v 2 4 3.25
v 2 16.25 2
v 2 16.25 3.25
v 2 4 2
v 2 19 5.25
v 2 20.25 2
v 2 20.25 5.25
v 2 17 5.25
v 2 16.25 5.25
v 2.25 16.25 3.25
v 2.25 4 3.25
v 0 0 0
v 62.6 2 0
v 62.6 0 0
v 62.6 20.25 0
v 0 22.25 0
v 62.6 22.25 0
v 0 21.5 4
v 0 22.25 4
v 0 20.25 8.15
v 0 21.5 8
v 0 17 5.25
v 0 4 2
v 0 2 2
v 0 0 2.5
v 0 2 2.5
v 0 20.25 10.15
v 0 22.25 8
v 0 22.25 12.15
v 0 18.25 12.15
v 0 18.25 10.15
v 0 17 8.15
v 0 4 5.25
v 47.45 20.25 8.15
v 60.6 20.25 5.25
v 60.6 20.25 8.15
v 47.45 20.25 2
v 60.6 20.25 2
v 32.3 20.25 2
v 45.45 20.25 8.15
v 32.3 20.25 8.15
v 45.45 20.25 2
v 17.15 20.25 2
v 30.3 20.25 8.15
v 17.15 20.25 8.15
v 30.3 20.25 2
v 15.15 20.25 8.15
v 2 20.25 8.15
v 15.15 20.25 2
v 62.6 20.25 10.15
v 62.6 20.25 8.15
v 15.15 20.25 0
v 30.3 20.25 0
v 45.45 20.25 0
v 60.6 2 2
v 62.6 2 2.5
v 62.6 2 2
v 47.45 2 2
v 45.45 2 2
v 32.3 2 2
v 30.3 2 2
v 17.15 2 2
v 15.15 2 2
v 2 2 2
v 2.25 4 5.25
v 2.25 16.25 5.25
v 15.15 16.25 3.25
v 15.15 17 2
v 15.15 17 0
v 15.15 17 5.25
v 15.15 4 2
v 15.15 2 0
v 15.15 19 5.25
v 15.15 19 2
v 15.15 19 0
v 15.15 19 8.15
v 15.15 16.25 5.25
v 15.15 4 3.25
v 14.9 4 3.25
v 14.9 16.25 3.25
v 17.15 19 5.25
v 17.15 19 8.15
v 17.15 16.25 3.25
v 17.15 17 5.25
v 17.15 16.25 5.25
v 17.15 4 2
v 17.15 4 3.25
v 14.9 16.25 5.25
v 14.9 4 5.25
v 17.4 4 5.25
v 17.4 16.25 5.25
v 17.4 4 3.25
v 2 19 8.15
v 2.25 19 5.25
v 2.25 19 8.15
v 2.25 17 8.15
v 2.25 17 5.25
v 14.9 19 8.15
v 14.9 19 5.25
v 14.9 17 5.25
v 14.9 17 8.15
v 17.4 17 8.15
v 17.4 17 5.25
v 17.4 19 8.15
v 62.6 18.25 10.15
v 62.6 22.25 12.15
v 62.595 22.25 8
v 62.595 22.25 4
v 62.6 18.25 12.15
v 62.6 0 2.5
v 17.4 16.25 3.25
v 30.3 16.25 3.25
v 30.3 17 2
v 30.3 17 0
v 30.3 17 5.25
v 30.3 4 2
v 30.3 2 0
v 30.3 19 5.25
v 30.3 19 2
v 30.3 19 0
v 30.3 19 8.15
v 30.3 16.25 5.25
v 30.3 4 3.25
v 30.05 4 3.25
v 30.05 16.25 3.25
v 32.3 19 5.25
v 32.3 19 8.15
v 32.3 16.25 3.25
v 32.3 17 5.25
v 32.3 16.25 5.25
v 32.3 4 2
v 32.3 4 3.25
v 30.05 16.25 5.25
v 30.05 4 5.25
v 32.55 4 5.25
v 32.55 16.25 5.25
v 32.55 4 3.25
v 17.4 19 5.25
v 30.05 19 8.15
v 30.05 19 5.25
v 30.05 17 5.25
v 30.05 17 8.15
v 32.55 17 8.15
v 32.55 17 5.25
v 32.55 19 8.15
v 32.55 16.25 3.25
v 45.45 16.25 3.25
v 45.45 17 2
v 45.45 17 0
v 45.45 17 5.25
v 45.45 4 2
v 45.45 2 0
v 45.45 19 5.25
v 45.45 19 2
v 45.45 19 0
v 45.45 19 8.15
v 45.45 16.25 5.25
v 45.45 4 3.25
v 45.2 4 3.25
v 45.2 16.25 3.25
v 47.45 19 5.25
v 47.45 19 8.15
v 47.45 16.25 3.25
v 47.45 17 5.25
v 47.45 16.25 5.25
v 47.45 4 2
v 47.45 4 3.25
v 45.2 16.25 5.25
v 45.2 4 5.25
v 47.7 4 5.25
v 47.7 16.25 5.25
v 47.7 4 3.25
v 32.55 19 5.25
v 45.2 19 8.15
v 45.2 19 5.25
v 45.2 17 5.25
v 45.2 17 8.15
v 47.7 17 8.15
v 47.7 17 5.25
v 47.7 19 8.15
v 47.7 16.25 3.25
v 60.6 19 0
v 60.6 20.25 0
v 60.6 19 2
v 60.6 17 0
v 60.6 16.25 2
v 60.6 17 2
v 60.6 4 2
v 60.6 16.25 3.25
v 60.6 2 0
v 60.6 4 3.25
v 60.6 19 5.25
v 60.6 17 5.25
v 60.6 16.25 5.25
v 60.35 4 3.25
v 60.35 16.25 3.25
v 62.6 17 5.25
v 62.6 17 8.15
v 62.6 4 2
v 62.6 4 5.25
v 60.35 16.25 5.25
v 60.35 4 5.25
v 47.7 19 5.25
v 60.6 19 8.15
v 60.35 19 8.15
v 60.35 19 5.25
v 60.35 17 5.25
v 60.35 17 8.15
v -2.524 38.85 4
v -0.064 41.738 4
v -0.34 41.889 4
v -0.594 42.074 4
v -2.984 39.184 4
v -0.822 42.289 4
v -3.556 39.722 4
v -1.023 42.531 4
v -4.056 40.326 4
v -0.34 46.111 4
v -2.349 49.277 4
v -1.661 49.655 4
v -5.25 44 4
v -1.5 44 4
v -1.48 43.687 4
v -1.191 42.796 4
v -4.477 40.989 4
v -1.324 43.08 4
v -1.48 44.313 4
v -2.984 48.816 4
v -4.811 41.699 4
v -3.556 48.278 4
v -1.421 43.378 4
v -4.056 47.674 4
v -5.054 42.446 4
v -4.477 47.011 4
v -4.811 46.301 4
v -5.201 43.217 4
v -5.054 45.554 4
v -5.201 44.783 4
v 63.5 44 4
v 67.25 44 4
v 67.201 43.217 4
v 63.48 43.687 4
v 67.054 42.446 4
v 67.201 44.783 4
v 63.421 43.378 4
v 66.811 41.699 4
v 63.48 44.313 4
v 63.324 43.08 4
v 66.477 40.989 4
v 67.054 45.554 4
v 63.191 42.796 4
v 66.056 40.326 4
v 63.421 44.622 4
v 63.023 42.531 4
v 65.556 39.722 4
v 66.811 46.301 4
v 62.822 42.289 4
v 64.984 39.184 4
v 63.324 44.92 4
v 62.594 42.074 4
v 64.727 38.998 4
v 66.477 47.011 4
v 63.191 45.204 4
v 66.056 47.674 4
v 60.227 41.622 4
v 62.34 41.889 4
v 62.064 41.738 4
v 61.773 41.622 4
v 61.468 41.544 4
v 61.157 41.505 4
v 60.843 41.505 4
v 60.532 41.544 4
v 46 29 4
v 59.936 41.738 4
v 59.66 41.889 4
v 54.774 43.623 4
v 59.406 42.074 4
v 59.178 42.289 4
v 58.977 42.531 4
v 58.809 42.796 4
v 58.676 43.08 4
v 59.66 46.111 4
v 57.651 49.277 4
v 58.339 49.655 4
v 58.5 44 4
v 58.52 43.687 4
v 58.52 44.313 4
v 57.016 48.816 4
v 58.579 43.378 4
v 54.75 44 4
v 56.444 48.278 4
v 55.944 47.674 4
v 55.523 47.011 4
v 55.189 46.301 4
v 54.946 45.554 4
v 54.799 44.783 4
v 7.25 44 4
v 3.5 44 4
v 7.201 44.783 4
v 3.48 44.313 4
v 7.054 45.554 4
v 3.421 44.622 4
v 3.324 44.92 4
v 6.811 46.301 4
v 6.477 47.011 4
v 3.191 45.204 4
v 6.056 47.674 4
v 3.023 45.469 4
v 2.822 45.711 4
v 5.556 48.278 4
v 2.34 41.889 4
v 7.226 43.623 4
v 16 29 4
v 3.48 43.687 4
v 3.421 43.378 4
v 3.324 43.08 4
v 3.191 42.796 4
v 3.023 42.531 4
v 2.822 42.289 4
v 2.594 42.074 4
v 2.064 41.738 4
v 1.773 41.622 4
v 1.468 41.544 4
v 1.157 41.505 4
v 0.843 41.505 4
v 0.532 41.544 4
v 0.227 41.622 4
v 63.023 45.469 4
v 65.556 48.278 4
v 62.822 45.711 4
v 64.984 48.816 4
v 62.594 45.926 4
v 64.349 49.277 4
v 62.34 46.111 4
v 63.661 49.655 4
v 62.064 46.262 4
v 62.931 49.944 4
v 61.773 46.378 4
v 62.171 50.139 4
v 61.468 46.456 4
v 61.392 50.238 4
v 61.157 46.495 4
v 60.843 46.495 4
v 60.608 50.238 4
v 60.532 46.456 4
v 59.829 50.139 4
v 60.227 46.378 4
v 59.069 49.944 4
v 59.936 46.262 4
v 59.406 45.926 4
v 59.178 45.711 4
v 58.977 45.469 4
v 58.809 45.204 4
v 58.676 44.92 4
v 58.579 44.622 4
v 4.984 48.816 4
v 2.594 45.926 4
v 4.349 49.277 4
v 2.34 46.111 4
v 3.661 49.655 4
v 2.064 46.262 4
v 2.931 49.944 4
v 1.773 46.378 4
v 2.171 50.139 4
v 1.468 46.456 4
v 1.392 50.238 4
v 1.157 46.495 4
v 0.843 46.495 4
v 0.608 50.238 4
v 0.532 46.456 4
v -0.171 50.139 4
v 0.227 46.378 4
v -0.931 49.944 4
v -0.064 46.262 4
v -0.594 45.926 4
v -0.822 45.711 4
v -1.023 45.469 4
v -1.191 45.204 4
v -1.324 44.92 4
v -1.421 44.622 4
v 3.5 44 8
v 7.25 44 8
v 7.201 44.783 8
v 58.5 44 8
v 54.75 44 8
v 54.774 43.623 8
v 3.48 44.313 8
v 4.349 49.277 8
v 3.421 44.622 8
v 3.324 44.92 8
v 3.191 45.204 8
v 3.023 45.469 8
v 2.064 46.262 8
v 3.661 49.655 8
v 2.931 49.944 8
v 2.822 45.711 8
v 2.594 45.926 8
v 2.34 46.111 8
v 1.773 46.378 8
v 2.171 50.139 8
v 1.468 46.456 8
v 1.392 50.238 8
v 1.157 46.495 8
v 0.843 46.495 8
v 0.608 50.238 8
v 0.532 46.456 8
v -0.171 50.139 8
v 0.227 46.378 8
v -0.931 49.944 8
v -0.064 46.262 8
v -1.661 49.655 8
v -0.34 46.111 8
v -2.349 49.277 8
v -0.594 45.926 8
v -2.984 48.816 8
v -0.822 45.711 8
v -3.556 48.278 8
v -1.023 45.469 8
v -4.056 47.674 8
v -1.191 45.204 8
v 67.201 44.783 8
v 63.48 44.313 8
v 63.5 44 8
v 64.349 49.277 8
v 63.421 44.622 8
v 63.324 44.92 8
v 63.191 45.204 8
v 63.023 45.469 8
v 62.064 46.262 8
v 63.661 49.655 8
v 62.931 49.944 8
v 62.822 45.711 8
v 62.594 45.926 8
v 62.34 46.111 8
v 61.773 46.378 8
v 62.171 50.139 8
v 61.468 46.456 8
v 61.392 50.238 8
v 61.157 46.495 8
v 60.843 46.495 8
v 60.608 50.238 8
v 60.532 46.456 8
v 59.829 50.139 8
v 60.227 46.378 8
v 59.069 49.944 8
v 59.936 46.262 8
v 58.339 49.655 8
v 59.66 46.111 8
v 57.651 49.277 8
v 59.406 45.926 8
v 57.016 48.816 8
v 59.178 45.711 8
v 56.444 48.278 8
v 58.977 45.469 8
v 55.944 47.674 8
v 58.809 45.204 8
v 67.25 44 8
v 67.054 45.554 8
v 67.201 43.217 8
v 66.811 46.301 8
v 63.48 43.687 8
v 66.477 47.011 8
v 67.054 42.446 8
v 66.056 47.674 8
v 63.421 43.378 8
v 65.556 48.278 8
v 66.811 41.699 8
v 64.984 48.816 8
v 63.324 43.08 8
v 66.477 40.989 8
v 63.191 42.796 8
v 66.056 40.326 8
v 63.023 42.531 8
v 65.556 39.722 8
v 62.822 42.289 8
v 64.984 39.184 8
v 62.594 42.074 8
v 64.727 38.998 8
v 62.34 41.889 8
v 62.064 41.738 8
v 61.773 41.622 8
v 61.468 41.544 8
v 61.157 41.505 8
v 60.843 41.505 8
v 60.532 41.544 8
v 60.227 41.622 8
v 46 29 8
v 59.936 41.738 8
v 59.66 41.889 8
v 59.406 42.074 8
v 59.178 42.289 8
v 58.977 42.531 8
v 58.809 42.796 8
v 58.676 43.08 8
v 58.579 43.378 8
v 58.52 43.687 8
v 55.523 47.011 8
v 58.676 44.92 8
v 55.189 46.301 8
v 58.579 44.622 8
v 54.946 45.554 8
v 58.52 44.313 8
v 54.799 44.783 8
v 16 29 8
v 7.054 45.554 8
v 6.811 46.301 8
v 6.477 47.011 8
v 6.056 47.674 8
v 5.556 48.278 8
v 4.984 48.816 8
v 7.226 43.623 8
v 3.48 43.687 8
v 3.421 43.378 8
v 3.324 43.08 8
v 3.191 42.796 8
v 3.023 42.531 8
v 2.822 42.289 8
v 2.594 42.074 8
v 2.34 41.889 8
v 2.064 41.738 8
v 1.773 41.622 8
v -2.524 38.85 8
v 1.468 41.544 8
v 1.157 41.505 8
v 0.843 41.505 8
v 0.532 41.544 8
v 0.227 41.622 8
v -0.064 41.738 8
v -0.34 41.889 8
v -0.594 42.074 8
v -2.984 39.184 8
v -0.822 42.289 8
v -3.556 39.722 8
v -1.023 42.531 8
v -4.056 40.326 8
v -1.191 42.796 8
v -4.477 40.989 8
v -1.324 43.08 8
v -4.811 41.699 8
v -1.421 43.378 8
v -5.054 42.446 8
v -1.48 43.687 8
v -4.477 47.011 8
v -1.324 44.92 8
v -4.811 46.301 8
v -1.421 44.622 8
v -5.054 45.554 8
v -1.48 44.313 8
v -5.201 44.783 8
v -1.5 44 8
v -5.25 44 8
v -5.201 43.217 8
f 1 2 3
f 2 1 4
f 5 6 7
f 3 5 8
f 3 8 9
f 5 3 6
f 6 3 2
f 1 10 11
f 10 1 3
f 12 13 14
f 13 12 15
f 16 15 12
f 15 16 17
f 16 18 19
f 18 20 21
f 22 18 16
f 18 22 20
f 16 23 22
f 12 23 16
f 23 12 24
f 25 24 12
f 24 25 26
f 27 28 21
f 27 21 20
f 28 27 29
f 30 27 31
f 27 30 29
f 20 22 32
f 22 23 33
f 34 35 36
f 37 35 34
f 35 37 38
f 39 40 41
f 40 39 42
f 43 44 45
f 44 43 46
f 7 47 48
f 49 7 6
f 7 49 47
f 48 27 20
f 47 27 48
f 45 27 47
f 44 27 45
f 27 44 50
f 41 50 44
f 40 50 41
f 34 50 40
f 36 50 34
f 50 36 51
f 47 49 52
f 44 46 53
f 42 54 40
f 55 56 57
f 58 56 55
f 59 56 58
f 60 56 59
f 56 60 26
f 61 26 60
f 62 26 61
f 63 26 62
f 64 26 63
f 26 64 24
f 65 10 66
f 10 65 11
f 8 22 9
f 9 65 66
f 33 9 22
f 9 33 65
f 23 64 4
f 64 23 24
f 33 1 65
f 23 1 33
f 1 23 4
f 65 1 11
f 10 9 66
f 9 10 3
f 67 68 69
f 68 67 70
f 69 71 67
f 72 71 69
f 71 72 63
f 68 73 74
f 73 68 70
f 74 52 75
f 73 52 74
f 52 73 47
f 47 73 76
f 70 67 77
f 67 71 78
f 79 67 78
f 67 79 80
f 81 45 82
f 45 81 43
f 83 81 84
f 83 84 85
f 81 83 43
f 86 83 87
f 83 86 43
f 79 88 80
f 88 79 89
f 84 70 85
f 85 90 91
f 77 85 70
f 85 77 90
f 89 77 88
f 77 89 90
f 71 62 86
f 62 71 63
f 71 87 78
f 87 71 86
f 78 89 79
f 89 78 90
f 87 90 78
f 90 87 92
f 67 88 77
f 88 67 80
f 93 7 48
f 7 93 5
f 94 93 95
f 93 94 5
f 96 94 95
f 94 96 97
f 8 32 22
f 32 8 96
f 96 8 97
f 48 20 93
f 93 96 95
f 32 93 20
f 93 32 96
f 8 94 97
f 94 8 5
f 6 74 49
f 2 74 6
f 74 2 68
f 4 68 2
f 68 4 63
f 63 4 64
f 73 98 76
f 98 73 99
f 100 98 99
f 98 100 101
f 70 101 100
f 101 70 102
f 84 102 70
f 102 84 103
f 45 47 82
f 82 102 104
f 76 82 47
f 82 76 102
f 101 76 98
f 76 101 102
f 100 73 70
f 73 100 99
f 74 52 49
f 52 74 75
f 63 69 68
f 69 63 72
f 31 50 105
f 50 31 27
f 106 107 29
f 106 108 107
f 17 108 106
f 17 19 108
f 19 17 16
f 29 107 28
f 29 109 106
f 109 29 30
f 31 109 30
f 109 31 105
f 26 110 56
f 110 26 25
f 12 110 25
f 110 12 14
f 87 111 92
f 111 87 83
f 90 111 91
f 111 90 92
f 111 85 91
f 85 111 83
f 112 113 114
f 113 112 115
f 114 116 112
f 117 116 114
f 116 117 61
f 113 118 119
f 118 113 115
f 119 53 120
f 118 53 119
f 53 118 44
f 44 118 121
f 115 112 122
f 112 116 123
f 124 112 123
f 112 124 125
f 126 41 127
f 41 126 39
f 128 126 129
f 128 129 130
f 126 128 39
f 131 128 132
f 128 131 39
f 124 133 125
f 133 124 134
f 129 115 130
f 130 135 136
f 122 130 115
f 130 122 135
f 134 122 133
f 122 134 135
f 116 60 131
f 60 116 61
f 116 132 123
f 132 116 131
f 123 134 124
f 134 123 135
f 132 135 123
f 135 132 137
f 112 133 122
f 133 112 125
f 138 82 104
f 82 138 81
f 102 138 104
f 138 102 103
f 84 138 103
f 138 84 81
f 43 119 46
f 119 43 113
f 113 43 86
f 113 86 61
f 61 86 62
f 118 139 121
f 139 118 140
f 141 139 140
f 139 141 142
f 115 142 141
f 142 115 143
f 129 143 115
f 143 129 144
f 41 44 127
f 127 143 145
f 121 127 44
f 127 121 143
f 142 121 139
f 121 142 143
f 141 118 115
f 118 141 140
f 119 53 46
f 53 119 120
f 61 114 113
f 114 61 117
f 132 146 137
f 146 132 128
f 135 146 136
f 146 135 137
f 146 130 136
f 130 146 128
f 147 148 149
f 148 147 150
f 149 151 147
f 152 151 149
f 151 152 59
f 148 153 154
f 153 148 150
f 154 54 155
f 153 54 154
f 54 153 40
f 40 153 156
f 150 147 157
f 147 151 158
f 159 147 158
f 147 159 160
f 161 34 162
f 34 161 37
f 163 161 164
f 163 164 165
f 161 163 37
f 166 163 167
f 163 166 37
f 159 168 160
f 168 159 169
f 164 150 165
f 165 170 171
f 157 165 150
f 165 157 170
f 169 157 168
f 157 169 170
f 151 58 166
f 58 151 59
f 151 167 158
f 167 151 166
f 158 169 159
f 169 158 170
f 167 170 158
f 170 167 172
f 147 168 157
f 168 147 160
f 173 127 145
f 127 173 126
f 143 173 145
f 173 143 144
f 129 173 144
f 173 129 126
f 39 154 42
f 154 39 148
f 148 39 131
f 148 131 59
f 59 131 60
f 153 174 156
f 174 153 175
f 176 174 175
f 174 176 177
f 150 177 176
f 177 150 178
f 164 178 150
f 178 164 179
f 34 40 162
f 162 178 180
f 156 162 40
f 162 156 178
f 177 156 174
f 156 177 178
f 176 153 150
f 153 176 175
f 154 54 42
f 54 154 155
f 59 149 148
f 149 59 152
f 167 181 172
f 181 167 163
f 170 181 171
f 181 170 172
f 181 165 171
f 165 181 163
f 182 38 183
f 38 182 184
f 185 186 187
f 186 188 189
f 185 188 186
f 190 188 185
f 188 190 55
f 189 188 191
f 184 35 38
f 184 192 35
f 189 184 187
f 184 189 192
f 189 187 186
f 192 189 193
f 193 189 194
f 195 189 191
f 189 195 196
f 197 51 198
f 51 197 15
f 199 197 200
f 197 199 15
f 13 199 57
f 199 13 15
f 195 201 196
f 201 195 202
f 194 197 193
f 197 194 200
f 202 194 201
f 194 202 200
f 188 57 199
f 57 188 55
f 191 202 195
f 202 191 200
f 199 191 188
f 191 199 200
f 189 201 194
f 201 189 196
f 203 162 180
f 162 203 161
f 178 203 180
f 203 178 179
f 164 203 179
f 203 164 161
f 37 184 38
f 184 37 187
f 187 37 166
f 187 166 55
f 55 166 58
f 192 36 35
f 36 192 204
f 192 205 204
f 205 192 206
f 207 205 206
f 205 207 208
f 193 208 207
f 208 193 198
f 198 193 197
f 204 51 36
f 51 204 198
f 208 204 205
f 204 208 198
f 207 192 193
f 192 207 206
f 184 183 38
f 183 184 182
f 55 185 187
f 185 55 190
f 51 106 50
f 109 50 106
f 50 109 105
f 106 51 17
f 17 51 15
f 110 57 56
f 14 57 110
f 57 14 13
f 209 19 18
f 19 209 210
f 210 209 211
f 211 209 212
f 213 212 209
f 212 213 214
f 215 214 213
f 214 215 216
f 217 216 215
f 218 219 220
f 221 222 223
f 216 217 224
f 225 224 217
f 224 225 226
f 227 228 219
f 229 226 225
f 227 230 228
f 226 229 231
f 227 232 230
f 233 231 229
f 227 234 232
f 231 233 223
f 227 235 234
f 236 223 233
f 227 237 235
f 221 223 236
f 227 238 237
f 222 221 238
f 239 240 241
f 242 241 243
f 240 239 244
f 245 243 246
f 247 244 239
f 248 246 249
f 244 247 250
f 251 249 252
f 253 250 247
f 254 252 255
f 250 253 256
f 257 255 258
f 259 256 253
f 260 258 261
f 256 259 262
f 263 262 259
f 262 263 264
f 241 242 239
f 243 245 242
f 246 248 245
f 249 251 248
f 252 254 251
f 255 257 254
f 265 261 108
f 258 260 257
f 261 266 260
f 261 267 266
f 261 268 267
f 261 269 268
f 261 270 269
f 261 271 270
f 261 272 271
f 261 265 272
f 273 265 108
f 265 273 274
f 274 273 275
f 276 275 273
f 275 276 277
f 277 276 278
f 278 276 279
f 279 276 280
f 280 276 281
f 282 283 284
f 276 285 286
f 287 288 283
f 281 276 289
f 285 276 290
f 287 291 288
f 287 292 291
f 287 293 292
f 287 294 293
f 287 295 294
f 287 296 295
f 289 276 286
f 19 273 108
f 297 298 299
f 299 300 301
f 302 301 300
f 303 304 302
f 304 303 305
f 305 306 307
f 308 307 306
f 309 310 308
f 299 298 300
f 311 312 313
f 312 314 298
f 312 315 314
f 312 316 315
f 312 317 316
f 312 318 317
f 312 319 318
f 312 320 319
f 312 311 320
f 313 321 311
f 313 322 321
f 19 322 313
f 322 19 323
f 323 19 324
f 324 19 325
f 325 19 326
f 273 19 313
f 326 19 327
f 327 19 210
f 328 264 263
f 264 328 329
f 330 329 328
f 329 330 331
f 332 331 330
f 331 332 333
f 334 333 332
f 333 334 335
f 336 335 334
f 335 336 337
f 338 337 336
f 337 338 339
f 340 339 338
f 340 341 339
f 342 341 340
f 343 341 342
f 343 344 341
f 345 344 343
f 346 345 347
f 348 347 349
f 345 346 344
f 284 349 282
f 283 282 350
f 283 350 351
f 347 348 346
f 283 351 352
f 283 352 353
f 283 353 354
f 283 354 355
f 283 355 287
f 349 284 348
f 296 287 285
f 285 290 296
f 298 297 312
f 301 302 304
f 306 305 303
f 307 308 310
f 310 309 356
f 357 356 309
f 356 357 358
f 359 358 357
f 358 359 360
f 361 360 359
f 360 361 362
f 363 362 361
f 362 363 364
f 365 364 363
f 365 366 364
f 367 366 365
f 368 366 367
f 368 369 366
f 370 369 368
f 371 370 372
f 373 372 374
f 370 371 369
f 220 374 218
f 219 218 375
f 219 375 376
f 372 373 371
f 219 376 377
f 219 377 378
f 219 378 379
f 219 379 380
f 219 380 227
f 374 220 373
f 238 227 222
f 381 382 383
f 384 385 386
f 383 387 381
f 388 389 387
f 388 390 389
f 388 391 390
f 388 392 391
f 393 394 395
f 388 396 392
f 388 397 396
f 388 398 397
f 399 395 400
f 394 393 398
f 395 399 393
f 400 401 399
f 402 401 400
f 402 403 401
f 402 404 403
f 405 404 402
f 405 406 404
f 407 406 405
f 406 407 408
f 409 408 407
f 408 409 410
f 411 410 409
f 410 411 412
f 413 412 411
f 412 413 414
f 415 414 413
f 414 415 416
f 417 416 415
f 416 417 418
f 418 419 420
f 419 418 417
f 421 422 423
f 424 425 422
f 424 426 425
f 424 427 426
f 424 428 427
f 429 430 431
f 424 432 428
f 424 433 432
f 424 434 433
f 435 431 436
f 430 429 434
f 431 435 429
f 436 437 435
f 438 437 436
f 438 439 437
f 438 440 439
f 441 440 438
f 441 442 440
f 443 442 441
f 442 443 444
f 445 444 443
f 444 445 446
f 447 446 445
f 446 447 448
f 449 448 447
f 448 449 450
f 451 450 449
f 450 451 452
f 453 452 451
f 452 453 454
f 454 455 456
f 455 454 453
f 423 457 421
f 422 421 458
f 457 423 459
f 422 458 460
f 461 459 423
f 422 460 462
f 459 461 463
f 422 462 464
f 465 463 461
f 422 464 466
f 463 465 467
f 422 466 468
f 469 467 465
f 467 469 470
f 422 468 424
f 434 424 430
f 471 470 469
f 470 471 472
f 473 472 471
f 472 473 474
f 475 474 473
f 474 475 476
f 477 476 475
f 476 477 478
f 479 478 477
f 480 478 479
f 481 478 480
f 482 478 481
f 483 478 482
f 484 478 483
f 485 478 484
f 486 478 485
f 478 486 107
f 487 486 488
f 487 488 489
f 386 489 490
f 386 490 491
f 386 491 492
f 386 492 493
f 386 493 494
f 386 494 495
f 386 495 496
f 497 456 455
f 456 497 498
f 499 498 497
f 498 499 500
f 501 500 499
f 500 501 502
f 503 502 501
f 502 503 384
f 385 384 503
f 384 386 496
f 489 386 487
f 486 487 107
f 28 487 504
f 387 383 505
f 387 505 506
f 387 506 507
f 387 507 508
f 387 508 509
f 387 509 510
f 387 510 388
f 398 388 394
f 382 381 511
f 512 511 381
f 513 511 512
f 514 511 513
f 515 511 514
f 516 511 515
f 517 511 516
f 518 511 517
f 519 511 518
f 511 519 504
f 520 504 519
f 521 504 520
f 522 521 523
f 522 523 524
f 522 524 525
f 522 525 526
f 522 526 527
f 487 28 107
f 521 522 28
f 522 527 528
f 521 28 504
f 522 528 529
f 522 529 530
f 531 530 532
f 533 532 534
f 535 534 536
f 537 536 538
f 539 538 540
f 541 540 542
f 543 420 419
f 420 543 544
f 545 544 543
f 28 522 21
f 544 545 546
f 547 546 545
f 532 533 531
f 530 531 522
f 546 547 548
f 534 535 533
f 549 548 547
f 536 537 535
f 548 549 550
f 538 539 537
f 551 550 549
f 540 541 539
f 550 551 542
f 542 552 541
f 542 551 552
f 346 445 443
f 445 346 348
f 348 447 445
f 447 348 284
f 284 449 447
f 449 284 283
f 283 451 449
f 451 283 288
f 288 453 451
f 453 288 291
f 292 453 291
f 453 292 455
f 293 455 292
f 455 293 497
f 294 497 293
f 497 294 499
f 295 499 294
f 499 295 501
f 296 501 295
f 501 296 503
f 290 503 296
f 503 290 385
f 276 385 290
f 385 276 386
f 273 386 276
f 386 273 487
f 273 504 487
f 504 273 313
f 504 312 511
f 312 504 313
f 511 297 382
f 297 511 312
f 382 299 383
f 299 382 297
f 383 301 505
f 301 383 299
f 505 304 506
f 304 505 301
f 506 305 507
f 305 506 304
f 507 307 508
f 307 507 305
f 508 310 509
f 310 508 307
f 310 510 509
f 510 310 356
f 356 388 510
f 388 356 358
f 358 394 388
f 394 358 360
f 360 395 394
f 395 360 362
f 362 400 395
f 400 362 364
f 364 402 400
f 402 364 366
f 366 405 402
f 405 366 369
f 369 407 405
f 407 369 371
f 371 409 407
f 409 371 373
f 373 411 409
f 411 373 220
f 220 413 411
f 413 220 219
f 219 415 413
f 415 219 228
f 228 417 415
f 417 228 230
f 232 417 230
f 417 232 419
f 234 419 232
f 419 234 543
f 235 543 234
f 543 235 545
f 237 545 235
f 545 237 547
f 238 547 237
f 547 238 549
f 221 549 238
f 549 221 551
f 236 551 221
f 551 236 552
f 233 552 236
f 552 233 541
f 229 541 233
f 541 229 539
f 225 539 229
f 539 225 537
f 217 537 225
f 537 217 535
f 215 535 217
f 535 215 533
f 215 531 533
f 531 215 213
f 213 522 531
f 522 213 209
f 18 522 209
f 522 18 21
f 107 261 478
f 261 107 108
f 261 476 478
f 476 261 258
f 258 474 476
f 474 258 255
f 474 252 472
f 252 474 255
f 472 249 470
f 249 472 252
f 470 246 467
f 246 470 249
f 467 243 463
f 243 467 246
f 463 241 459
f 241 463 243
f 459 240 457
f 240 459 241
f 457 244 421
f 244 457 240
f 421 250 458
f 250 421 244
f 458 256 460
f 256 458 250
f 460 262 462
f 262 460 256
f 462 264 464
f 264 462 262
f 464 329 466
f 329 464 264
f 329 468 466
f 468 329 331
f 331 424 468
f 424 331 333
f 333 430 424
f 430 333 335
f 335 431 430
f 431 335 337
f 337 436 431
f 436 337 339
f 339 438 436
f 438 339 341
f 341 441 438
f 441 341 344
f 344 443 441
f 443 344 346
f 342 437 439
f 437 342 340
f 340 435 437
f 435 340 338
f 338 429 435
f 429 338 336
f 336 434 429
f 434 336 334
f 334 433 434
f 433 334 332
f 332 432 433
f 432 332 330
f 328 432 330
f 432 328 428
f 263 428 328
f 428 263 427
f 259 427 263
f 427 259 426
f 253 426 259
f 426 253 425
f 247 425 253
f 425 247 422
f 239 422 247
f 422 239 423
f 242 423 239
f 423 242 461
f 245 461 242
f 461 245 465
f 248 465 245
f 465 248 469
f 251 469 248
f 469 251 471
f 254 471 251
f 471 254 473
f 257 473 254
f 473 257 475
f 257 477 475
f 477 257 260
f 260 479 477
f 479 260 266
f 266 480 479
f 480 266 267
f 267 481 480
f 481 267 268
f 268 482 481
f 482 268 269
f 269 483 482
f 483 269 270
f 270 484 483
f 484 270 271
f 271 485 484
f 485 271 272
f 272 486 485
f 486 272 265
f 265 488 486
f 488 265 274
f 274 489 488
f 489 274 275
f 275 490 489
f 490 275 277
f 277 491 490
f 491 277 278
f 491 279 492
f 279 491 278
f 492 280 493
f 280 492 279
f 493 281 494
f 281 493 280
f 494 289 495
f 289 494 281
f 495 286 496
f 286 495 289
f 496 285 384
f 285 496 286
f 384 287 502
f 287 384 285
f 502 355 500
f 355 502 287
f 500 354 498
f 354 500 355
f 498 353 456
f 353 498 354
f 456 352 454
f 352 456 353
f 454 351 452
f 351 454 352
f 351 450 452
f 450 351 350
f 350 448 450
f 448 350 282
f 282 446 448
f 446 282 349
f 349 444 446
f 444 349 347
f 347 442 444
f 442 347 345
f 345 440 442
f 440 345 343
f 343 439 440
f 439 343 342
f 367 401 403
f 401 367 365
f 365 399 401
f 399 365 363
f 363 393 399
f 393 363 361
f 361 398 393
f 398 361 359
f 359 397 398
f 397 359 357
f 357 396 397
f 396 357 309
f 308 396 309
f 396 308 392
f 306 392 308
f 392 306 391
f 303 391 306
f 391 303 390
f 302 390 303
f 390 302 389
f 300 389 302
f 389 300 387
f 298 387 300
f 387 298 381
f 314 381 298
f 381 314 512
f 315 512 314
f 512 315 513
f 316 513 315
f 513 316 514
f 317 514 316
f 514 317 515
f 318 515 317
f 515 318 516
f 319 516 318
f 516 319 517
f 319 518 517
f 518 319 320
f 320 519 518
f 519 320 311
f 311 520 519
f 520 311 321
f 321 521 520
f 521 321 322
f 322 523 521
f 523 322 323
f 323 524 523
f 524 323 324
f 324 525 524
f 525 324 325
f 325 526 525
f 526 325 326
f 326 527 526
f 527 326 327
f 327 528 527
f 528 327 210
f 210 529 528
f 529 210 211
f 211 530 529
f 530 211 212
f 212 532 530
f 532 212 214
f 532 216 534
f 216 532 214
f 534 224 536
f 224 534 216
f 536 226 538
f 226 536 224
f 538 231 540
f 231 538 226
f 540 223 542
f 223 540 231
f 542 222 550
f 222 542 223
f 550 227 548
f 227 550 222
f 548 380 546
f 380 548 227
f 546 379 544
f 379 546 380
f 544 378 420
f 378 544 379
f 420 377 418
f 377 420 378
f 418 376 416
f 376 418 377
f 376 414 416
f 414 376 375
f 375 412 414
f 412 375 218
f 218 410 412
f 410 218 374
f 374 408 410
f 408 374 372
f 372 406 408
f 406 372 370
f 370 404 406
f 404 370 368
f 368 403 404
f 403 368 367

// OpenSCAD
// ////////////////////////////////////////////////
//
// WAGO 221 mount
//
// Creates a single row or double row set of 221 blocks
// with mounting tabs/ears at either end.
//
// Created - 2017/01/01 by Joo Chung
//
// ////////////////////////////////////////////////

// ////////////////////////////////////////////////
// vector of blocks. each element specifies the number of conductors for that block
// EDIT THIS
blocks = [2,2,2,2]; // a single 5 conductor blocks 
// blocks = [5, 3, 2]; // a set of 5 conductor, 3 conductor, 2 conductor blocks
// blocks = [5, 5, 5]; // a set of three 5 conductor blocks
// blocks = [2]; // a single 2 conductor block
// blocks = [3]; // a single 3 conductor block


// ////////////////////////////////////////////////
// Mirror the mount, stand it up, and put tabs on bottom.
// 0 - no mirror, 1 - mirror, rotate so its standing up, and reposition tabs
// 2 - mirror, rotate so that they are laying flat, and reposition tabs.
// EDIT THIS
mirror = 0;

// ////////////////////////////////////////////////
// Tabs - include or exclude mounting tabs
// EDIT THIS: 0 - no tabs, 1 - tabs
tabs = 0;
// EDIT THIS: radius of hole in tab
tabradius = 2.6;
// EDIT THIS: thickness of tab
tabheight = 4;
// EDIT THIS: Set width and length of the tab. (tab is basically a square)
tabwidth = 0;



// ////////////////////////////////////////////////
// Block dimensions in mm -- DO NOT EDIT
conwidth = 5.6; // width of a single conductor
// DO NOT EDIT
border = 1.75; // block transparent plastic border
// DO NOT EDIT
blockdepth = 18.25;
// DO NOT EDIT
fudge = 0.2;

// ////////////////////////////////////////////////
// OpenSCAD special variables -- DO NOT EDIT
$fa = 1;
// DO NOT EDIT
$fs = 0.4;

// ////////////////////////////////////////////////
// Functions
function bw(x) = conwidth*x+border+fudge; // block width
function mw(i, n) = ( i==0 ? bw(blocks[i]) + 2 + mw(i+1, n) : (i < n ? bw(blocks[i]) + 2 + mw(i+1, n) : 0)); // mount width (index, max index)


// ////////////////////////////////////////////////
// Modules
module tab(width, hole, thickness) {
    difference() {
        union () {
            cylinder(thickness,width/2,width/2, true);
            translate([width/4,0,0]) cube([width/2,width,thickness], true);
        }
    cylinder(width,hole,hole, true);
    }
}

module shoulder (depth) {
    difference () {
        union () {
            cube([2, blockdepth, 3.25], false);
            translate([0,0,3.25]) cube([2.25, blockdepth, 2], false);
        }
        translate([0,0,2]) cube([2.25,2,3.25], false);
        translate([2,blockdepth-4,2]) cube([0.25,4,3.25], false);
    }
}


module backshoulder (height) {
    difference() {
        union() {  
            translate([0, 2, 0]) cube ([2, 1.25, 10.15]);
            cube ([2.25, 2, 10.15]);
        }
        translate([0,0,10.15-2]) cube([2.25,3.25,2]);
        translate([2,0,2]) cube([1.25,3.25,3.25]);
    }
}



// WAGO 221 block
module block (nconn) {
    blockwidth = bw(nconn);

    // base
    translate([2,2,0]) cube([blockwidth, blockdepth, 2], false);
    
    // back headboard
    translate([0,blockdepth+2,0]) cube([blockwidth+4, 2, 10.15], false);

    // back lip
    translate([0,blockdepth,10.15]) cube([blockwidth+4, 4, 2], false);
    
    // front lip
    translate([0,0,0]) cube([blockwidth+4, 2, 2.5], false);

    // left shoulder and right shoulders
    translate([0,2,0]) shoulder();
    translate([blockwidth+4,2,0]) mirror() shoulder(); 
    
    // back left and shoulder
    translate([0, blockdepth-1.25, 0]) backshoulder(); 
    translate([blockwidth+4, blockdepth -1.25, 0]) mirror() backshoulder();
    
}



// ////////////////////////////////////////////////
// MAIN BODY

mountwidth=mw(0, len(blocks));
if (mirror==0) { // No mirror. Single row of blocks
    // create array of blocks
    for (i=[0:len(blocks)-1]) {
        offset = (i==0) ? tabwidth : tabwidth + mw(0, i);
        translate([offset, 0, 0]) block(blocks[i]);
    }
    
    // left and right tabs
    if (tabs==1) {
        translate([tabwidth/2,(blockdepth+4)/2,tabheight/2]) tab (tabwidth, tabradius, tabheight);
        translate([mountwidth+2+tabwidth+tabwidth/2,(blockdepth+4)/2,tabheight/2]) mirror() tab (tabwidth, tabradius, tabheight);
    }
} else if (mirror==1) { // Mirrored. two rows of blocks, back to back.
    // Row #1. Stand up on headboard.
    rotate([-90,0,0]) for (i=[0:len(blocks)-1]) {
        offset = (i==0) ? tabwidth : tabwidth + mw(0, i);
        translate([offset, 0, -1]) block(blocks[i]);
    }
    
    // Row #2. Opposite rotation. Stand up on headbord
    rotate([90,0,0]) mirror ([0, 1, 0]) for (i=[0:len(blocks)-1]) {
        offset = (i==0) ? tabwidth : tabwidth + mw(0, i);
        translate([offset, 0, -1]) block(blocks[i]);
    }   
    
    // left and right tabs
    if (tabs==1) {
        translate([tabwidth/2,0,-blockdepth-tabheight/2]) tab (tabwidth, tabradius, tabheight);
        translate([mountwidth+2+tabwidth+tabwidth/2,0,-blockdepth-tabheight/2]) mirror() tab (tabwidth, tabradius, tabheight);
    }
} else if (mirror==2) {
    // Row #1. 
    for (i=[0:len(blocks)-1]) {
        offset = (i==0) ? tabwidth : tabwidth + mw(0, i);
        translate([offset, -blockdepth-6, -1]) block(blocks[i]);
    }
    
    // Row #2. Flip
    mirror ([0, 1, 0]) for (i=[0:len(blocks)-1]) {
        offset = (i==0) ? tabwidth : tabwidth + mw(0, i);
        translate([offset, -blockdepth, -1]) block(blocks[i]);
    }   
    
    // left and right tabs
    if (tabs==1) {
        translate([tabwidth/2,-3,(tabheight-2)/2]) tab (tabwidth, tabradius, tabheight);
        translate([mountwidth+2+tabwidth+tabwidth/2,-3,(tabheight-2)/2]) mirror() tab (tabwidth, tabradius, tabheight);
    }
}

translate([0,0,4]) {
linear_extrude(4) {
    translate([66,49,0]) {
        rotate([0,0,180]) {
            difference() {
                mountingPlate();
                
                translate([5,5,0]) {
                    ender3BedMntPattern();
                }
            }
        }
    }
}
}

module mountingPlate() {
    union() {
        difference() {
            baseMountingPlate();
            
            square([5,5]);
            
            translate([65,0,0]) {
                square([5,5]);
            }
        }
        
        translate([5,5,0]) {
            circle(d=12.5, $fn=50);
        }
        
        translate([65,5,0]) {
            circle(d=12.5, $fn=50);
        }
    }
}

module baseMountingPlate() {
        mount_points = [
        [0,0],
        [8,0],
        [20,20],
        [50,20],
        [62,0],
        [70,0],
        [66,27.5],
        [3.5,27.5],
    ];

    mount_lines = [
        [0,1,2,3,4,5,6,7]
    ];

    polygon(mount_points, mount_lines); 
}

module ender3BedMntPattern() {
    union() {
        m5hole();
        
        translate([60,0,0]) {
            m5hole();
        }
    }
}
    
module m5hole() {
    circle(d=5, $fn=50);
}
